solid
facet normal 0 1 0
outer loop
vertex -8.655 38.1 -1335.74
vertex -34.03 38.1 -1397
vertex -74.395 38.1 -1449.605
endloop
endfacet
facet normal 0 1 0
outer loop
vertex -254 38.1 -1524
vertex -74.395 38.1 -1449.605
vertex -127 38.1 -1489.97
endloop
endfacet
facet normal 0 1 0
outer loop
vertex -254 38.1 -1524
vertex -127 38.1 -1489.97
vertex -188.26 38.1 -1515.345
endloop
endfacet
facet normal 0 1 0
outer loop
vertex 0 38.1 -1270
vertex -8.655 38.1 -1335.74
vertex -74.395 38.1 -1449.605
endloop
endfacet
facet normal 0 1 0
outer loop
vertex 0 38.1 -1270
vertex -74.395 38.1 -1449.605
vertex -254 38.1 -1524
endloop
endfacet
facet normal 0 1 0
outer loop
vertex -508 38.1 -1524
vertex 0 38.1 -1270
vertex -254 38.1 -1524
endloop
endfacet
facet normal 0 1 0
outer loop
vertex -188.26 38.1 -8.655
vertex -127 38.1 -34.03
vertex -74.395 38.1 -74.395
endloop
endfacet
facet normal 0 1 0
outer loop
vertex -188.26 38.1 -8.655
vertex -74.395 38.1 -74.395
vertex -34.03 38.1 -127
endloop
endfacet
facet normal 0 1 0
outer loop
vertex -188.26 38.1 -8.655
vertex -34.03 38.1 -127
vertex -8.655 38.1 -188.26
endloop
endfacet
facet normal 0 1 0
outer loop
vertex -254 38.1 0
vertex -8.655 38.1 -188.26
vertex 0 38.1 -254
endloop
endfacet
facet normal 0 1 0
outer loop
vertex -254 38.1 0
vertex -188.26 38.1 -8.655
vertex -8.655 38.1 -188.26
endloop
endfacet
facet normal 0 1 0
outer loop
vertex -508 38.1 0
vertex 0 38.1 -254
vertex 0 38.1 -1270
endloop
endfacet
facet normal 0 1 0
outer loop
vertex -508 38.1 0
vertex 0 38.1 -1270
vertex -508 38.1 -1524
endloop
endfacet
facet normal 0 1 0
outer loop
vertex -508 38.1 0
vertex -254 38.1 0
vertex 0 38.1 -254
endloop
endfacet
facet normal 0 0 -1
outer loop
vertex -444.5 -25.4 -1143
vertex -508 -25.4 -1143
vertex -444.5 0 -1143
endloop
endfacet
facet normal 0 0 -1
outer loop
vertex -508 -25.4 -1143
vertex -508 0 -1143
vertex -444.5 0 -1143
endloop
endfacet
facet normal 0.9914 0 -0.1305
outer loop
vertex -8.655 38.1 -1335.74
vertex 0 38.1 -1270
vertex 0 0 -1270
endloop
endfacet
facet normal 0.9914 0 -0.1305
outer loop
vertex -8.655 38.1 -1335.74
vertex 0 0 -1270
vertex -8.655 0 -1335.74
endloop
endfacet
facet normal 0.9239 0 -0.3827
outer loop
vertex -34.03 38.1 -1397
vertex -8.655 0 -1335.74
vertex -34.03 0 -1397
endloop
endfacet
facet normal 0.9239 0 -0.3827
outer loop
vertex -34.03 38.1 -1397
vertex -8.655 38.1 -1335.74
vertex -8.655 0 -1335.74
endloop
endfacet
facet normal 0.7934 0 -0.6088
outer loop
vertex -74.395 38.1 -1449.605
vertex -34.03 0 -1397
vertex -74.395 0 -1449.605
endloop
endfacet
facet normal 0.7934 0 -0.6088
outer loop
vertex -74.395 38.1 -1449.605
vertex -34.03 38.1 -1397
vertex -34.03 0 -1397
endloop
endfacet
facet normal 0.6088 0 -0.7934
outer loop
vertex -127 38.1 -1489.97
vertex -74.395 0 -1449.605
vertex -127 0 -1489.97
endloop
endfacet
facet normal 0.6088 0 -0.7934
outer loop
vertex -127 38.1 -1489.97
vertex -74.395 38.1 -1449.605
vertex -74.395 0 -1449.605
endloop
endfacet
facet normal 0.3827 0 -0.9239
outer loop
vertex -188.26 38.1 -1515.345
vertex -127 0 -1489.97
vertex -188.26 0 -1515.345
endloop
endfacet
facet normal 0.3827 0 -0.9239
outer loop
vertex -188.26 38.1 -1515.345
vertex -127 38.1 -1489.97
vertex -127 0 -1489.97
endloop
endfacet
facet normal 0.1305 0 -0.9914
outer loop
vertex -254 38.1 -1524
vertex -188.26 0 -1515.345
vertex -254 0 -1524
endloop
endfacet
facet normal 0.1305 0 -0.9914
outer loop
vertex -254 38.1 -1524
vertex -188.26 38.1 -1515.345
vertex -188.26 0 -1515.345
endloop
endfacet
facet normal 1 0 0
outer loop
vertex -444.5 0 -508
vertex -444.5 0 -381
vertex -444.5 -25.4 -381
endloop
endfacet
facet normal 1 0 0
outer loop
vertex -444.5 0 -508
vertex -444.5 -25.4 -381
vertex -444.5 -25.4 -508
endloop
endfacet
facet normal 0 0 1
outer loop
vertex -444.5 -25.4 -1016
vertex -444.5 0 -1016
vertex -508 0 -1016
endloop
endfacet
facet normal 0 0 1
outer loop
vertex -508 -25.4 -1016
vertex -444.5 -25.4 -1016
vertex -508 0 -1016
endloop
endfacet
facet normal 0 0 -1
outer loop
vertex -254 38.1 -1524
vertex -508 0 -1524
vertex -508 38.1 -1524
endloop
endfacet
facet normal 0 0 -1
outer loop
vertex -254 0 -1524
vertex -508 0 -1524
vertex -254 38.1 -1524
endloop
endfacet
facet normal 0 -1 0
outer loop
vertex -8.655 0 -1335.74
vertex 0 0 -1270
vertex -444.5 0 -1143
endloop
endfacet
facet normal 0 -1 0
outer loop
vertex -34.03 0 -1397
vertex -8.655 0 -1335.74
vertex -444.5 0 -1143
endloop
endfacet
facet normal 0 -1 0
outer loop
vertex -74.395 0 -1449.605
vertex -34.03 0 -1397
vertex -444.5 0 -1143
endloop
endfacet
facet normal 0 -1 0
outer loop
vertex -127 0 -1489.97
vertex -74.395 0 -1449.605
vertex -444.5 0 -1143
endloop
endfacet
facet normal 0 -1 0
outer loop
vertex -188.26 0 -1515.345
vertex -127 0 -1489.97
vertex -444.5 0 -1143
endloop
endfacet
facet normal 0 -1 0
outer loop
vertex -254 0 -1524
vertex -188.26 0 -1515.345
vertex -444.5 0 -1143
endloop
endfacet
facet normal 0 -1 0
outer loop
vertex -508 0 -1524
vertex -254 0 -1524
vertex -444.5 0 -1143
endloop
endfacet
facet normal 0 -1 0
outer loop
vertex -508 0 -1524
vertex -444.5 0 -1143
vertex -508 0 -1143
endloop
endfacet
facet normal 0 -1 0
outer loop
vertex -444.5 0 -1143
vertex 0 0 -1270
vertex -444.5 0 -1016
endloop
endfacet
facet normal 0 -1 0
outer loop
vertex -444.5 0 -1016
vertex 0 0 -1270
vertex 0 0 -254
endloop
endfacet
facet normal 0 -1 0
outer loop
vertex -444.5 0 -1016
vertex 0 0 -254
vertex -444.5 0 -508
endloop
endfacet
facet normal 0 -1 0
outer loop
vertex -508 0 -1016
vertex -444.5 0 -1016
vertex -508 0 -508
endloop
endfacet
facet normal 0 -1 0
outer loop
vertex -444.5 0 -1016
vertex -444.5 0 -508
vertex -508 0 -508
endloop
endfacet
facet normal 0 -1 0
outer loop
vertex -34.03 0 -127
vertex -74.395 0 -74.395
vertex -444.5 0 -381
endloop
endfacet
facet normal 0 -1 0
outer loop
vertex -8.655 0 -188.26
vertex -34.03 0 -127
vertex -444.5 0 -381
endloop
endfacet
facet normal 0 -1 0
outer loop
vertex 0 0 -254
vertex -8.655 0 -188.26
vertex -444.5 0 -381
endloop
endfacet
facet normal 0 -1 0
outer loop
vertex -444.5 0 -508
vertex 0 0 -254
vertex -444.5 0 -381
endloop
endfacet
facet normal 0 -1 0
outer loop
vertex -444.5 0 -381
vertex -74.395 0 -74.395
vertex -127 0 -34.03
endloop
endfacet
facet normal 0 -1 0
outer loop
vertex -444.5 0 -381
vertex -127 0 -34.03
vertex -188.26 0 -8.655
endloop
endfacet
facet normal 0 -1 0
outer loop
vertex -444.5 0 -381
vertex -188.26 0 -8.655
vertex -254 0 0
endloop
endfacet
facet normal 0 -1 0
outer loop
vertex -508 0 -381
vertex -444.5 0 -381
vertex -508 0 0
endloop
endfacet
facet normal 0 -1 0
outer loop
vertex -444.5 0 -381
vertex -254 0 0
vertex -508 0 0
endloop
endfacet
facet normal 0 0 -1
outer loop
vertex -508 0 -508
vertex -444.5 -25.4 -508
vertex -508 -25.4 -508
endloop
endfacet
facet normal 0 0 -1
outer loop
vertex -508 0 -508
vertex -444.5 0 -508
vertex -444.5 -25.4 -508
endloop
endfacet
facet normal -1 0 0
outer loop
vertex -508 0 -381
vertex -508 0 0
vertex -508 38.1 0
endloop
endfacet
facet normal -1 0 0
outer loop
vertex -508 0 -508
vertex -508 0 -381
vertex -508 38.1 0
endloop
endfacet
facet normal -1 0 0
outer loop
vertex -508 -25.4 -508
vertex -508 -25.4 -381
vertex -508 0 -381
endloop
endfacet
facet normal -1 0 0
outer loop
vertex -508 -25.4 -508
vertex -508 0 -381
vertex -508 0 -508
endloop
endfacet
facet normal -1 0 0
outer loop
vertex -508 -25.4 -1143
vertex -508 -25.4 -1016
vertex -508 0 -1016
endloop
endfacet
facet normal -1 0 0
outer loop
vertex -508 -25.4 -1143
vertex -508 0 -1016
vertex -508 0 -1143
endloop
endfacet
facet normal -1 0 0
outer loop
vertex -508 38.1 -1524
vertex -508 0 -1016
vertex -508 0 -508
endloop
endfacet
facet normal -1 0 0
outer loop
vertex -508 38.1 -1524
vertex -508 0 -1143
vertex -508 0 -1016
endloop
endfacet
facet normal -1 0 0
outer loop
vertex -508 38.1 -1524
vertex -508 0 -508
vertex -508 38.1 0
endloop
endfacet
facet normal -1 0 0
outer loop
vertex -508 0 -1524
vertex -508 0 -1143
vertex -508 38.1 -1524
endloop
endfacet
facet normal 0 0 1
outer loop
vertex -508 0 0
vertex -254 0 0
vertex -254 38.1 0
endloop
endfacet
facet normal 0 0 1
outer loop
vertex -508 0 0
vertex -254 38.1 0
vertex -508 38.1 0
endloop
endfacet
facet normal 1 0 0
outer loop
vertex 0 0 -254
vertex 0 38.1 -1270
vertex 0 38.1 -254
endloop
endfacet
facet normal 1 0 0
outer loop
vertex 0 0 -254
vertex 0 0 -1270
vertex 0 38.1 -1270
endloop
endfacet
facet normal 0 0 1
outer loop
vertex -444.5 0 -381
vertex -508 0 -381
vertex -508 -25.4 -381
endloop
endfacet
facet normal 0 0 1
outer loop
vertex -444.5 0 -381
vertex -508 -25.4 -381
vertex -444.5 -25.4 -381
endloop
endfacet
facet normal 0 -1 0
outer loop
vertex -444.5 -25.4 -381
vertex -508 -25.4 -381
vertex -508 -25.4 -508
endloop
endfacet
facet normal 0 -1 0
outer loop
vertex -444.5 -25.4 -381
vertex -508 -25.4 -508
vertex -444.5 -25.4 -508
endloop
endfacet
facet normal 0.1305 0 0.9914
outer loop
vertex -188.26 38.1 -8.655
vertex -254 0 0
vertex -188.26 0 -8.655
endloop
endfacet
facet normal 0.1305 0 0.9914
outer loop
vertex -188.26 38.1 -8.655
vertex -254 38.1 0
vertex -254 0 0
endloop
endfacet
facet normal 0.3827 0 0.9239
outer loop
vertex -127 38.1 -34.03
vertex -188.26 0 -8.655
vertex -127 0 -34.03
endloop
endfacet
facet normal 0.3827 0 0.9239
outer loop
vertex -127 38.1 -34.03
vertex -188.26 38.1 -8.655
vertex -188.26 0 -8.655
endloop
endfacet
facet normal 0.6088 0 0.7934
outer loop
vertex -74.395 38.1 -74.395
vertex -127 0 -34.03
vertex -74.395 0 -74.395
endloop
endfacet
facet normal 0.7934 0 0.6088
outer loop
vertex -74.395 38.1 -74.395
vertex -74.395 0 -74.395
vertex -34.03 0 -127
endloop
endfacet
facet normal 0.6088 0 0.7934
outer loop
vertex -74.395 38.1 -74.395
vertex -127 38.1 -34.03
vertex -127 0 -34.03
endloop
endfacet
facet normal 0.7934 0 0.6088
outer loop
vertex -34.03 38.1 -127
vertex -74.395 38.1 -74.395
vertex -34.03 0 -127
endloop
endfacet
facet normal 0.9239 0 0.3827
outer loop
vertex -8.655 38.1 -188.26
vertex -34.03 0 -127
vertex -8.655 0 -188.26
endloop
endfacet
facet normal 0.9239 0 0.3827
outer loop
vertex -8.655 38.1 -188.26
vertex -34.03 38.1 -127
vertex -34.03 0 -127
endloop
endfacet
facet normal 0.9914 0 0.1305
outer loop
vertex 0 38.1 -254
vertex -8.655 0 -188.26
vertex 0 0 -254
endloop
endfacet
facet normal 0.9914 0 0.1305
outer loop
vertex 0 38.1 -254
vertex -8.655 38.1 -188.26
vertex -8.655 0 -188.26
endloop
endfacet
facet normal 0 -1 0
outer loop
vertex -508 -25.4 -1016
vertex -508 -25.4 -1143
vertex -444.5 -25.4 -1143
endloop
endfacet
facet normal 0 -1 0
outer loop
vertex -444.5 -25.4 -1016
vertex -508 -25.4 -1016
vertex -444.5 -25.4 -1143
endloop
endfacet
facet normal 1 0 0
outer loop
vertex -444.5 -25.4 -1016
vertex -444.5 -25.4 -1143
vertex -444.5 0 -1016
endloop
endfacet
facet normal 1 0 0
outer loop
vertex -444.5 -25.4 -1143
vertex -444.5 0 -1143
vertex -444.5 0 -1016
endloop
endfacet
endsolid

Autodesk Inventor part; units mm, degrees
ref_plane "YZ Plane" through (0, 0, 0) normal (1, 0, 0) x (0, 1, 0)
ref_plane "XZ Plane" through (0, 0, 0) normal (0, 1, 0) x (-1, 0, 0)
ref_plane "XY Plane" through (0, 0, 0) normal (0, 0, 1) x (1, 0, 0)
sketch "Sketch1" plane through (0, 0, 0) normal (0, 1, 0) x (-1, 0, 0)
  line L0 (0, 0) -> (508, 0)
  line L1 (508, 0) -> (508, -1524)
  line L2 (508, -1524) -> (0, -1524)
  line L3 (0, -1524) -> (0, 0)
  dimension "d0" = 1524
  dimension "d1" = 508
extrude "Extrusion1" add sketch "Sketch1" along normal blind 38.1
fillet "Fillet1" radius 254 1 edges at (0, 19.05, 0)
fillet "Fillet2" radius 254 1 edges at (0, 19.05, -1524)
sketch "Sketch2" plane through (0, 0, 0) normal (0, -1, 0) x (1, 0, 0)
  line L0 (-254, -1524) -> (-508, -1524) projected
  line L1 (-508, -1524) -> (-508, 0) projected
  line L2 (-508, -1524) -> (-508, 0)
  line L3 (-508, 0) -> (-508, -381)
  line L4 (-508, -381) -> (-444.5, -381)
  line L5 (-444.5, -381) -> (-444.5, -508)
  line L6 (-444.5, -508) -> (-508, -508)
  line L7 (-508, -1524) -> (-508, -1143)
  line L8 (-508, -1143) -> (-444.5, -1143)
  line L9 (-444.5, -1143) -> (-444.5, -1016)
  line L10 (-444.5, -1016) -> (-508, -1016)
  point P0 (0, 0)
  dimension "d6" = 381
  dimension "d7" = 63.5
  dimension "d8" = 127
  dimension "d9" = 381
  dimension "d10" = 127
extrude "Extrusion2" add sketch "Sketch2" along normal blind 25.4
properties part number "Shelf-ver1-1111-2021" material "Aluminum 6061"
